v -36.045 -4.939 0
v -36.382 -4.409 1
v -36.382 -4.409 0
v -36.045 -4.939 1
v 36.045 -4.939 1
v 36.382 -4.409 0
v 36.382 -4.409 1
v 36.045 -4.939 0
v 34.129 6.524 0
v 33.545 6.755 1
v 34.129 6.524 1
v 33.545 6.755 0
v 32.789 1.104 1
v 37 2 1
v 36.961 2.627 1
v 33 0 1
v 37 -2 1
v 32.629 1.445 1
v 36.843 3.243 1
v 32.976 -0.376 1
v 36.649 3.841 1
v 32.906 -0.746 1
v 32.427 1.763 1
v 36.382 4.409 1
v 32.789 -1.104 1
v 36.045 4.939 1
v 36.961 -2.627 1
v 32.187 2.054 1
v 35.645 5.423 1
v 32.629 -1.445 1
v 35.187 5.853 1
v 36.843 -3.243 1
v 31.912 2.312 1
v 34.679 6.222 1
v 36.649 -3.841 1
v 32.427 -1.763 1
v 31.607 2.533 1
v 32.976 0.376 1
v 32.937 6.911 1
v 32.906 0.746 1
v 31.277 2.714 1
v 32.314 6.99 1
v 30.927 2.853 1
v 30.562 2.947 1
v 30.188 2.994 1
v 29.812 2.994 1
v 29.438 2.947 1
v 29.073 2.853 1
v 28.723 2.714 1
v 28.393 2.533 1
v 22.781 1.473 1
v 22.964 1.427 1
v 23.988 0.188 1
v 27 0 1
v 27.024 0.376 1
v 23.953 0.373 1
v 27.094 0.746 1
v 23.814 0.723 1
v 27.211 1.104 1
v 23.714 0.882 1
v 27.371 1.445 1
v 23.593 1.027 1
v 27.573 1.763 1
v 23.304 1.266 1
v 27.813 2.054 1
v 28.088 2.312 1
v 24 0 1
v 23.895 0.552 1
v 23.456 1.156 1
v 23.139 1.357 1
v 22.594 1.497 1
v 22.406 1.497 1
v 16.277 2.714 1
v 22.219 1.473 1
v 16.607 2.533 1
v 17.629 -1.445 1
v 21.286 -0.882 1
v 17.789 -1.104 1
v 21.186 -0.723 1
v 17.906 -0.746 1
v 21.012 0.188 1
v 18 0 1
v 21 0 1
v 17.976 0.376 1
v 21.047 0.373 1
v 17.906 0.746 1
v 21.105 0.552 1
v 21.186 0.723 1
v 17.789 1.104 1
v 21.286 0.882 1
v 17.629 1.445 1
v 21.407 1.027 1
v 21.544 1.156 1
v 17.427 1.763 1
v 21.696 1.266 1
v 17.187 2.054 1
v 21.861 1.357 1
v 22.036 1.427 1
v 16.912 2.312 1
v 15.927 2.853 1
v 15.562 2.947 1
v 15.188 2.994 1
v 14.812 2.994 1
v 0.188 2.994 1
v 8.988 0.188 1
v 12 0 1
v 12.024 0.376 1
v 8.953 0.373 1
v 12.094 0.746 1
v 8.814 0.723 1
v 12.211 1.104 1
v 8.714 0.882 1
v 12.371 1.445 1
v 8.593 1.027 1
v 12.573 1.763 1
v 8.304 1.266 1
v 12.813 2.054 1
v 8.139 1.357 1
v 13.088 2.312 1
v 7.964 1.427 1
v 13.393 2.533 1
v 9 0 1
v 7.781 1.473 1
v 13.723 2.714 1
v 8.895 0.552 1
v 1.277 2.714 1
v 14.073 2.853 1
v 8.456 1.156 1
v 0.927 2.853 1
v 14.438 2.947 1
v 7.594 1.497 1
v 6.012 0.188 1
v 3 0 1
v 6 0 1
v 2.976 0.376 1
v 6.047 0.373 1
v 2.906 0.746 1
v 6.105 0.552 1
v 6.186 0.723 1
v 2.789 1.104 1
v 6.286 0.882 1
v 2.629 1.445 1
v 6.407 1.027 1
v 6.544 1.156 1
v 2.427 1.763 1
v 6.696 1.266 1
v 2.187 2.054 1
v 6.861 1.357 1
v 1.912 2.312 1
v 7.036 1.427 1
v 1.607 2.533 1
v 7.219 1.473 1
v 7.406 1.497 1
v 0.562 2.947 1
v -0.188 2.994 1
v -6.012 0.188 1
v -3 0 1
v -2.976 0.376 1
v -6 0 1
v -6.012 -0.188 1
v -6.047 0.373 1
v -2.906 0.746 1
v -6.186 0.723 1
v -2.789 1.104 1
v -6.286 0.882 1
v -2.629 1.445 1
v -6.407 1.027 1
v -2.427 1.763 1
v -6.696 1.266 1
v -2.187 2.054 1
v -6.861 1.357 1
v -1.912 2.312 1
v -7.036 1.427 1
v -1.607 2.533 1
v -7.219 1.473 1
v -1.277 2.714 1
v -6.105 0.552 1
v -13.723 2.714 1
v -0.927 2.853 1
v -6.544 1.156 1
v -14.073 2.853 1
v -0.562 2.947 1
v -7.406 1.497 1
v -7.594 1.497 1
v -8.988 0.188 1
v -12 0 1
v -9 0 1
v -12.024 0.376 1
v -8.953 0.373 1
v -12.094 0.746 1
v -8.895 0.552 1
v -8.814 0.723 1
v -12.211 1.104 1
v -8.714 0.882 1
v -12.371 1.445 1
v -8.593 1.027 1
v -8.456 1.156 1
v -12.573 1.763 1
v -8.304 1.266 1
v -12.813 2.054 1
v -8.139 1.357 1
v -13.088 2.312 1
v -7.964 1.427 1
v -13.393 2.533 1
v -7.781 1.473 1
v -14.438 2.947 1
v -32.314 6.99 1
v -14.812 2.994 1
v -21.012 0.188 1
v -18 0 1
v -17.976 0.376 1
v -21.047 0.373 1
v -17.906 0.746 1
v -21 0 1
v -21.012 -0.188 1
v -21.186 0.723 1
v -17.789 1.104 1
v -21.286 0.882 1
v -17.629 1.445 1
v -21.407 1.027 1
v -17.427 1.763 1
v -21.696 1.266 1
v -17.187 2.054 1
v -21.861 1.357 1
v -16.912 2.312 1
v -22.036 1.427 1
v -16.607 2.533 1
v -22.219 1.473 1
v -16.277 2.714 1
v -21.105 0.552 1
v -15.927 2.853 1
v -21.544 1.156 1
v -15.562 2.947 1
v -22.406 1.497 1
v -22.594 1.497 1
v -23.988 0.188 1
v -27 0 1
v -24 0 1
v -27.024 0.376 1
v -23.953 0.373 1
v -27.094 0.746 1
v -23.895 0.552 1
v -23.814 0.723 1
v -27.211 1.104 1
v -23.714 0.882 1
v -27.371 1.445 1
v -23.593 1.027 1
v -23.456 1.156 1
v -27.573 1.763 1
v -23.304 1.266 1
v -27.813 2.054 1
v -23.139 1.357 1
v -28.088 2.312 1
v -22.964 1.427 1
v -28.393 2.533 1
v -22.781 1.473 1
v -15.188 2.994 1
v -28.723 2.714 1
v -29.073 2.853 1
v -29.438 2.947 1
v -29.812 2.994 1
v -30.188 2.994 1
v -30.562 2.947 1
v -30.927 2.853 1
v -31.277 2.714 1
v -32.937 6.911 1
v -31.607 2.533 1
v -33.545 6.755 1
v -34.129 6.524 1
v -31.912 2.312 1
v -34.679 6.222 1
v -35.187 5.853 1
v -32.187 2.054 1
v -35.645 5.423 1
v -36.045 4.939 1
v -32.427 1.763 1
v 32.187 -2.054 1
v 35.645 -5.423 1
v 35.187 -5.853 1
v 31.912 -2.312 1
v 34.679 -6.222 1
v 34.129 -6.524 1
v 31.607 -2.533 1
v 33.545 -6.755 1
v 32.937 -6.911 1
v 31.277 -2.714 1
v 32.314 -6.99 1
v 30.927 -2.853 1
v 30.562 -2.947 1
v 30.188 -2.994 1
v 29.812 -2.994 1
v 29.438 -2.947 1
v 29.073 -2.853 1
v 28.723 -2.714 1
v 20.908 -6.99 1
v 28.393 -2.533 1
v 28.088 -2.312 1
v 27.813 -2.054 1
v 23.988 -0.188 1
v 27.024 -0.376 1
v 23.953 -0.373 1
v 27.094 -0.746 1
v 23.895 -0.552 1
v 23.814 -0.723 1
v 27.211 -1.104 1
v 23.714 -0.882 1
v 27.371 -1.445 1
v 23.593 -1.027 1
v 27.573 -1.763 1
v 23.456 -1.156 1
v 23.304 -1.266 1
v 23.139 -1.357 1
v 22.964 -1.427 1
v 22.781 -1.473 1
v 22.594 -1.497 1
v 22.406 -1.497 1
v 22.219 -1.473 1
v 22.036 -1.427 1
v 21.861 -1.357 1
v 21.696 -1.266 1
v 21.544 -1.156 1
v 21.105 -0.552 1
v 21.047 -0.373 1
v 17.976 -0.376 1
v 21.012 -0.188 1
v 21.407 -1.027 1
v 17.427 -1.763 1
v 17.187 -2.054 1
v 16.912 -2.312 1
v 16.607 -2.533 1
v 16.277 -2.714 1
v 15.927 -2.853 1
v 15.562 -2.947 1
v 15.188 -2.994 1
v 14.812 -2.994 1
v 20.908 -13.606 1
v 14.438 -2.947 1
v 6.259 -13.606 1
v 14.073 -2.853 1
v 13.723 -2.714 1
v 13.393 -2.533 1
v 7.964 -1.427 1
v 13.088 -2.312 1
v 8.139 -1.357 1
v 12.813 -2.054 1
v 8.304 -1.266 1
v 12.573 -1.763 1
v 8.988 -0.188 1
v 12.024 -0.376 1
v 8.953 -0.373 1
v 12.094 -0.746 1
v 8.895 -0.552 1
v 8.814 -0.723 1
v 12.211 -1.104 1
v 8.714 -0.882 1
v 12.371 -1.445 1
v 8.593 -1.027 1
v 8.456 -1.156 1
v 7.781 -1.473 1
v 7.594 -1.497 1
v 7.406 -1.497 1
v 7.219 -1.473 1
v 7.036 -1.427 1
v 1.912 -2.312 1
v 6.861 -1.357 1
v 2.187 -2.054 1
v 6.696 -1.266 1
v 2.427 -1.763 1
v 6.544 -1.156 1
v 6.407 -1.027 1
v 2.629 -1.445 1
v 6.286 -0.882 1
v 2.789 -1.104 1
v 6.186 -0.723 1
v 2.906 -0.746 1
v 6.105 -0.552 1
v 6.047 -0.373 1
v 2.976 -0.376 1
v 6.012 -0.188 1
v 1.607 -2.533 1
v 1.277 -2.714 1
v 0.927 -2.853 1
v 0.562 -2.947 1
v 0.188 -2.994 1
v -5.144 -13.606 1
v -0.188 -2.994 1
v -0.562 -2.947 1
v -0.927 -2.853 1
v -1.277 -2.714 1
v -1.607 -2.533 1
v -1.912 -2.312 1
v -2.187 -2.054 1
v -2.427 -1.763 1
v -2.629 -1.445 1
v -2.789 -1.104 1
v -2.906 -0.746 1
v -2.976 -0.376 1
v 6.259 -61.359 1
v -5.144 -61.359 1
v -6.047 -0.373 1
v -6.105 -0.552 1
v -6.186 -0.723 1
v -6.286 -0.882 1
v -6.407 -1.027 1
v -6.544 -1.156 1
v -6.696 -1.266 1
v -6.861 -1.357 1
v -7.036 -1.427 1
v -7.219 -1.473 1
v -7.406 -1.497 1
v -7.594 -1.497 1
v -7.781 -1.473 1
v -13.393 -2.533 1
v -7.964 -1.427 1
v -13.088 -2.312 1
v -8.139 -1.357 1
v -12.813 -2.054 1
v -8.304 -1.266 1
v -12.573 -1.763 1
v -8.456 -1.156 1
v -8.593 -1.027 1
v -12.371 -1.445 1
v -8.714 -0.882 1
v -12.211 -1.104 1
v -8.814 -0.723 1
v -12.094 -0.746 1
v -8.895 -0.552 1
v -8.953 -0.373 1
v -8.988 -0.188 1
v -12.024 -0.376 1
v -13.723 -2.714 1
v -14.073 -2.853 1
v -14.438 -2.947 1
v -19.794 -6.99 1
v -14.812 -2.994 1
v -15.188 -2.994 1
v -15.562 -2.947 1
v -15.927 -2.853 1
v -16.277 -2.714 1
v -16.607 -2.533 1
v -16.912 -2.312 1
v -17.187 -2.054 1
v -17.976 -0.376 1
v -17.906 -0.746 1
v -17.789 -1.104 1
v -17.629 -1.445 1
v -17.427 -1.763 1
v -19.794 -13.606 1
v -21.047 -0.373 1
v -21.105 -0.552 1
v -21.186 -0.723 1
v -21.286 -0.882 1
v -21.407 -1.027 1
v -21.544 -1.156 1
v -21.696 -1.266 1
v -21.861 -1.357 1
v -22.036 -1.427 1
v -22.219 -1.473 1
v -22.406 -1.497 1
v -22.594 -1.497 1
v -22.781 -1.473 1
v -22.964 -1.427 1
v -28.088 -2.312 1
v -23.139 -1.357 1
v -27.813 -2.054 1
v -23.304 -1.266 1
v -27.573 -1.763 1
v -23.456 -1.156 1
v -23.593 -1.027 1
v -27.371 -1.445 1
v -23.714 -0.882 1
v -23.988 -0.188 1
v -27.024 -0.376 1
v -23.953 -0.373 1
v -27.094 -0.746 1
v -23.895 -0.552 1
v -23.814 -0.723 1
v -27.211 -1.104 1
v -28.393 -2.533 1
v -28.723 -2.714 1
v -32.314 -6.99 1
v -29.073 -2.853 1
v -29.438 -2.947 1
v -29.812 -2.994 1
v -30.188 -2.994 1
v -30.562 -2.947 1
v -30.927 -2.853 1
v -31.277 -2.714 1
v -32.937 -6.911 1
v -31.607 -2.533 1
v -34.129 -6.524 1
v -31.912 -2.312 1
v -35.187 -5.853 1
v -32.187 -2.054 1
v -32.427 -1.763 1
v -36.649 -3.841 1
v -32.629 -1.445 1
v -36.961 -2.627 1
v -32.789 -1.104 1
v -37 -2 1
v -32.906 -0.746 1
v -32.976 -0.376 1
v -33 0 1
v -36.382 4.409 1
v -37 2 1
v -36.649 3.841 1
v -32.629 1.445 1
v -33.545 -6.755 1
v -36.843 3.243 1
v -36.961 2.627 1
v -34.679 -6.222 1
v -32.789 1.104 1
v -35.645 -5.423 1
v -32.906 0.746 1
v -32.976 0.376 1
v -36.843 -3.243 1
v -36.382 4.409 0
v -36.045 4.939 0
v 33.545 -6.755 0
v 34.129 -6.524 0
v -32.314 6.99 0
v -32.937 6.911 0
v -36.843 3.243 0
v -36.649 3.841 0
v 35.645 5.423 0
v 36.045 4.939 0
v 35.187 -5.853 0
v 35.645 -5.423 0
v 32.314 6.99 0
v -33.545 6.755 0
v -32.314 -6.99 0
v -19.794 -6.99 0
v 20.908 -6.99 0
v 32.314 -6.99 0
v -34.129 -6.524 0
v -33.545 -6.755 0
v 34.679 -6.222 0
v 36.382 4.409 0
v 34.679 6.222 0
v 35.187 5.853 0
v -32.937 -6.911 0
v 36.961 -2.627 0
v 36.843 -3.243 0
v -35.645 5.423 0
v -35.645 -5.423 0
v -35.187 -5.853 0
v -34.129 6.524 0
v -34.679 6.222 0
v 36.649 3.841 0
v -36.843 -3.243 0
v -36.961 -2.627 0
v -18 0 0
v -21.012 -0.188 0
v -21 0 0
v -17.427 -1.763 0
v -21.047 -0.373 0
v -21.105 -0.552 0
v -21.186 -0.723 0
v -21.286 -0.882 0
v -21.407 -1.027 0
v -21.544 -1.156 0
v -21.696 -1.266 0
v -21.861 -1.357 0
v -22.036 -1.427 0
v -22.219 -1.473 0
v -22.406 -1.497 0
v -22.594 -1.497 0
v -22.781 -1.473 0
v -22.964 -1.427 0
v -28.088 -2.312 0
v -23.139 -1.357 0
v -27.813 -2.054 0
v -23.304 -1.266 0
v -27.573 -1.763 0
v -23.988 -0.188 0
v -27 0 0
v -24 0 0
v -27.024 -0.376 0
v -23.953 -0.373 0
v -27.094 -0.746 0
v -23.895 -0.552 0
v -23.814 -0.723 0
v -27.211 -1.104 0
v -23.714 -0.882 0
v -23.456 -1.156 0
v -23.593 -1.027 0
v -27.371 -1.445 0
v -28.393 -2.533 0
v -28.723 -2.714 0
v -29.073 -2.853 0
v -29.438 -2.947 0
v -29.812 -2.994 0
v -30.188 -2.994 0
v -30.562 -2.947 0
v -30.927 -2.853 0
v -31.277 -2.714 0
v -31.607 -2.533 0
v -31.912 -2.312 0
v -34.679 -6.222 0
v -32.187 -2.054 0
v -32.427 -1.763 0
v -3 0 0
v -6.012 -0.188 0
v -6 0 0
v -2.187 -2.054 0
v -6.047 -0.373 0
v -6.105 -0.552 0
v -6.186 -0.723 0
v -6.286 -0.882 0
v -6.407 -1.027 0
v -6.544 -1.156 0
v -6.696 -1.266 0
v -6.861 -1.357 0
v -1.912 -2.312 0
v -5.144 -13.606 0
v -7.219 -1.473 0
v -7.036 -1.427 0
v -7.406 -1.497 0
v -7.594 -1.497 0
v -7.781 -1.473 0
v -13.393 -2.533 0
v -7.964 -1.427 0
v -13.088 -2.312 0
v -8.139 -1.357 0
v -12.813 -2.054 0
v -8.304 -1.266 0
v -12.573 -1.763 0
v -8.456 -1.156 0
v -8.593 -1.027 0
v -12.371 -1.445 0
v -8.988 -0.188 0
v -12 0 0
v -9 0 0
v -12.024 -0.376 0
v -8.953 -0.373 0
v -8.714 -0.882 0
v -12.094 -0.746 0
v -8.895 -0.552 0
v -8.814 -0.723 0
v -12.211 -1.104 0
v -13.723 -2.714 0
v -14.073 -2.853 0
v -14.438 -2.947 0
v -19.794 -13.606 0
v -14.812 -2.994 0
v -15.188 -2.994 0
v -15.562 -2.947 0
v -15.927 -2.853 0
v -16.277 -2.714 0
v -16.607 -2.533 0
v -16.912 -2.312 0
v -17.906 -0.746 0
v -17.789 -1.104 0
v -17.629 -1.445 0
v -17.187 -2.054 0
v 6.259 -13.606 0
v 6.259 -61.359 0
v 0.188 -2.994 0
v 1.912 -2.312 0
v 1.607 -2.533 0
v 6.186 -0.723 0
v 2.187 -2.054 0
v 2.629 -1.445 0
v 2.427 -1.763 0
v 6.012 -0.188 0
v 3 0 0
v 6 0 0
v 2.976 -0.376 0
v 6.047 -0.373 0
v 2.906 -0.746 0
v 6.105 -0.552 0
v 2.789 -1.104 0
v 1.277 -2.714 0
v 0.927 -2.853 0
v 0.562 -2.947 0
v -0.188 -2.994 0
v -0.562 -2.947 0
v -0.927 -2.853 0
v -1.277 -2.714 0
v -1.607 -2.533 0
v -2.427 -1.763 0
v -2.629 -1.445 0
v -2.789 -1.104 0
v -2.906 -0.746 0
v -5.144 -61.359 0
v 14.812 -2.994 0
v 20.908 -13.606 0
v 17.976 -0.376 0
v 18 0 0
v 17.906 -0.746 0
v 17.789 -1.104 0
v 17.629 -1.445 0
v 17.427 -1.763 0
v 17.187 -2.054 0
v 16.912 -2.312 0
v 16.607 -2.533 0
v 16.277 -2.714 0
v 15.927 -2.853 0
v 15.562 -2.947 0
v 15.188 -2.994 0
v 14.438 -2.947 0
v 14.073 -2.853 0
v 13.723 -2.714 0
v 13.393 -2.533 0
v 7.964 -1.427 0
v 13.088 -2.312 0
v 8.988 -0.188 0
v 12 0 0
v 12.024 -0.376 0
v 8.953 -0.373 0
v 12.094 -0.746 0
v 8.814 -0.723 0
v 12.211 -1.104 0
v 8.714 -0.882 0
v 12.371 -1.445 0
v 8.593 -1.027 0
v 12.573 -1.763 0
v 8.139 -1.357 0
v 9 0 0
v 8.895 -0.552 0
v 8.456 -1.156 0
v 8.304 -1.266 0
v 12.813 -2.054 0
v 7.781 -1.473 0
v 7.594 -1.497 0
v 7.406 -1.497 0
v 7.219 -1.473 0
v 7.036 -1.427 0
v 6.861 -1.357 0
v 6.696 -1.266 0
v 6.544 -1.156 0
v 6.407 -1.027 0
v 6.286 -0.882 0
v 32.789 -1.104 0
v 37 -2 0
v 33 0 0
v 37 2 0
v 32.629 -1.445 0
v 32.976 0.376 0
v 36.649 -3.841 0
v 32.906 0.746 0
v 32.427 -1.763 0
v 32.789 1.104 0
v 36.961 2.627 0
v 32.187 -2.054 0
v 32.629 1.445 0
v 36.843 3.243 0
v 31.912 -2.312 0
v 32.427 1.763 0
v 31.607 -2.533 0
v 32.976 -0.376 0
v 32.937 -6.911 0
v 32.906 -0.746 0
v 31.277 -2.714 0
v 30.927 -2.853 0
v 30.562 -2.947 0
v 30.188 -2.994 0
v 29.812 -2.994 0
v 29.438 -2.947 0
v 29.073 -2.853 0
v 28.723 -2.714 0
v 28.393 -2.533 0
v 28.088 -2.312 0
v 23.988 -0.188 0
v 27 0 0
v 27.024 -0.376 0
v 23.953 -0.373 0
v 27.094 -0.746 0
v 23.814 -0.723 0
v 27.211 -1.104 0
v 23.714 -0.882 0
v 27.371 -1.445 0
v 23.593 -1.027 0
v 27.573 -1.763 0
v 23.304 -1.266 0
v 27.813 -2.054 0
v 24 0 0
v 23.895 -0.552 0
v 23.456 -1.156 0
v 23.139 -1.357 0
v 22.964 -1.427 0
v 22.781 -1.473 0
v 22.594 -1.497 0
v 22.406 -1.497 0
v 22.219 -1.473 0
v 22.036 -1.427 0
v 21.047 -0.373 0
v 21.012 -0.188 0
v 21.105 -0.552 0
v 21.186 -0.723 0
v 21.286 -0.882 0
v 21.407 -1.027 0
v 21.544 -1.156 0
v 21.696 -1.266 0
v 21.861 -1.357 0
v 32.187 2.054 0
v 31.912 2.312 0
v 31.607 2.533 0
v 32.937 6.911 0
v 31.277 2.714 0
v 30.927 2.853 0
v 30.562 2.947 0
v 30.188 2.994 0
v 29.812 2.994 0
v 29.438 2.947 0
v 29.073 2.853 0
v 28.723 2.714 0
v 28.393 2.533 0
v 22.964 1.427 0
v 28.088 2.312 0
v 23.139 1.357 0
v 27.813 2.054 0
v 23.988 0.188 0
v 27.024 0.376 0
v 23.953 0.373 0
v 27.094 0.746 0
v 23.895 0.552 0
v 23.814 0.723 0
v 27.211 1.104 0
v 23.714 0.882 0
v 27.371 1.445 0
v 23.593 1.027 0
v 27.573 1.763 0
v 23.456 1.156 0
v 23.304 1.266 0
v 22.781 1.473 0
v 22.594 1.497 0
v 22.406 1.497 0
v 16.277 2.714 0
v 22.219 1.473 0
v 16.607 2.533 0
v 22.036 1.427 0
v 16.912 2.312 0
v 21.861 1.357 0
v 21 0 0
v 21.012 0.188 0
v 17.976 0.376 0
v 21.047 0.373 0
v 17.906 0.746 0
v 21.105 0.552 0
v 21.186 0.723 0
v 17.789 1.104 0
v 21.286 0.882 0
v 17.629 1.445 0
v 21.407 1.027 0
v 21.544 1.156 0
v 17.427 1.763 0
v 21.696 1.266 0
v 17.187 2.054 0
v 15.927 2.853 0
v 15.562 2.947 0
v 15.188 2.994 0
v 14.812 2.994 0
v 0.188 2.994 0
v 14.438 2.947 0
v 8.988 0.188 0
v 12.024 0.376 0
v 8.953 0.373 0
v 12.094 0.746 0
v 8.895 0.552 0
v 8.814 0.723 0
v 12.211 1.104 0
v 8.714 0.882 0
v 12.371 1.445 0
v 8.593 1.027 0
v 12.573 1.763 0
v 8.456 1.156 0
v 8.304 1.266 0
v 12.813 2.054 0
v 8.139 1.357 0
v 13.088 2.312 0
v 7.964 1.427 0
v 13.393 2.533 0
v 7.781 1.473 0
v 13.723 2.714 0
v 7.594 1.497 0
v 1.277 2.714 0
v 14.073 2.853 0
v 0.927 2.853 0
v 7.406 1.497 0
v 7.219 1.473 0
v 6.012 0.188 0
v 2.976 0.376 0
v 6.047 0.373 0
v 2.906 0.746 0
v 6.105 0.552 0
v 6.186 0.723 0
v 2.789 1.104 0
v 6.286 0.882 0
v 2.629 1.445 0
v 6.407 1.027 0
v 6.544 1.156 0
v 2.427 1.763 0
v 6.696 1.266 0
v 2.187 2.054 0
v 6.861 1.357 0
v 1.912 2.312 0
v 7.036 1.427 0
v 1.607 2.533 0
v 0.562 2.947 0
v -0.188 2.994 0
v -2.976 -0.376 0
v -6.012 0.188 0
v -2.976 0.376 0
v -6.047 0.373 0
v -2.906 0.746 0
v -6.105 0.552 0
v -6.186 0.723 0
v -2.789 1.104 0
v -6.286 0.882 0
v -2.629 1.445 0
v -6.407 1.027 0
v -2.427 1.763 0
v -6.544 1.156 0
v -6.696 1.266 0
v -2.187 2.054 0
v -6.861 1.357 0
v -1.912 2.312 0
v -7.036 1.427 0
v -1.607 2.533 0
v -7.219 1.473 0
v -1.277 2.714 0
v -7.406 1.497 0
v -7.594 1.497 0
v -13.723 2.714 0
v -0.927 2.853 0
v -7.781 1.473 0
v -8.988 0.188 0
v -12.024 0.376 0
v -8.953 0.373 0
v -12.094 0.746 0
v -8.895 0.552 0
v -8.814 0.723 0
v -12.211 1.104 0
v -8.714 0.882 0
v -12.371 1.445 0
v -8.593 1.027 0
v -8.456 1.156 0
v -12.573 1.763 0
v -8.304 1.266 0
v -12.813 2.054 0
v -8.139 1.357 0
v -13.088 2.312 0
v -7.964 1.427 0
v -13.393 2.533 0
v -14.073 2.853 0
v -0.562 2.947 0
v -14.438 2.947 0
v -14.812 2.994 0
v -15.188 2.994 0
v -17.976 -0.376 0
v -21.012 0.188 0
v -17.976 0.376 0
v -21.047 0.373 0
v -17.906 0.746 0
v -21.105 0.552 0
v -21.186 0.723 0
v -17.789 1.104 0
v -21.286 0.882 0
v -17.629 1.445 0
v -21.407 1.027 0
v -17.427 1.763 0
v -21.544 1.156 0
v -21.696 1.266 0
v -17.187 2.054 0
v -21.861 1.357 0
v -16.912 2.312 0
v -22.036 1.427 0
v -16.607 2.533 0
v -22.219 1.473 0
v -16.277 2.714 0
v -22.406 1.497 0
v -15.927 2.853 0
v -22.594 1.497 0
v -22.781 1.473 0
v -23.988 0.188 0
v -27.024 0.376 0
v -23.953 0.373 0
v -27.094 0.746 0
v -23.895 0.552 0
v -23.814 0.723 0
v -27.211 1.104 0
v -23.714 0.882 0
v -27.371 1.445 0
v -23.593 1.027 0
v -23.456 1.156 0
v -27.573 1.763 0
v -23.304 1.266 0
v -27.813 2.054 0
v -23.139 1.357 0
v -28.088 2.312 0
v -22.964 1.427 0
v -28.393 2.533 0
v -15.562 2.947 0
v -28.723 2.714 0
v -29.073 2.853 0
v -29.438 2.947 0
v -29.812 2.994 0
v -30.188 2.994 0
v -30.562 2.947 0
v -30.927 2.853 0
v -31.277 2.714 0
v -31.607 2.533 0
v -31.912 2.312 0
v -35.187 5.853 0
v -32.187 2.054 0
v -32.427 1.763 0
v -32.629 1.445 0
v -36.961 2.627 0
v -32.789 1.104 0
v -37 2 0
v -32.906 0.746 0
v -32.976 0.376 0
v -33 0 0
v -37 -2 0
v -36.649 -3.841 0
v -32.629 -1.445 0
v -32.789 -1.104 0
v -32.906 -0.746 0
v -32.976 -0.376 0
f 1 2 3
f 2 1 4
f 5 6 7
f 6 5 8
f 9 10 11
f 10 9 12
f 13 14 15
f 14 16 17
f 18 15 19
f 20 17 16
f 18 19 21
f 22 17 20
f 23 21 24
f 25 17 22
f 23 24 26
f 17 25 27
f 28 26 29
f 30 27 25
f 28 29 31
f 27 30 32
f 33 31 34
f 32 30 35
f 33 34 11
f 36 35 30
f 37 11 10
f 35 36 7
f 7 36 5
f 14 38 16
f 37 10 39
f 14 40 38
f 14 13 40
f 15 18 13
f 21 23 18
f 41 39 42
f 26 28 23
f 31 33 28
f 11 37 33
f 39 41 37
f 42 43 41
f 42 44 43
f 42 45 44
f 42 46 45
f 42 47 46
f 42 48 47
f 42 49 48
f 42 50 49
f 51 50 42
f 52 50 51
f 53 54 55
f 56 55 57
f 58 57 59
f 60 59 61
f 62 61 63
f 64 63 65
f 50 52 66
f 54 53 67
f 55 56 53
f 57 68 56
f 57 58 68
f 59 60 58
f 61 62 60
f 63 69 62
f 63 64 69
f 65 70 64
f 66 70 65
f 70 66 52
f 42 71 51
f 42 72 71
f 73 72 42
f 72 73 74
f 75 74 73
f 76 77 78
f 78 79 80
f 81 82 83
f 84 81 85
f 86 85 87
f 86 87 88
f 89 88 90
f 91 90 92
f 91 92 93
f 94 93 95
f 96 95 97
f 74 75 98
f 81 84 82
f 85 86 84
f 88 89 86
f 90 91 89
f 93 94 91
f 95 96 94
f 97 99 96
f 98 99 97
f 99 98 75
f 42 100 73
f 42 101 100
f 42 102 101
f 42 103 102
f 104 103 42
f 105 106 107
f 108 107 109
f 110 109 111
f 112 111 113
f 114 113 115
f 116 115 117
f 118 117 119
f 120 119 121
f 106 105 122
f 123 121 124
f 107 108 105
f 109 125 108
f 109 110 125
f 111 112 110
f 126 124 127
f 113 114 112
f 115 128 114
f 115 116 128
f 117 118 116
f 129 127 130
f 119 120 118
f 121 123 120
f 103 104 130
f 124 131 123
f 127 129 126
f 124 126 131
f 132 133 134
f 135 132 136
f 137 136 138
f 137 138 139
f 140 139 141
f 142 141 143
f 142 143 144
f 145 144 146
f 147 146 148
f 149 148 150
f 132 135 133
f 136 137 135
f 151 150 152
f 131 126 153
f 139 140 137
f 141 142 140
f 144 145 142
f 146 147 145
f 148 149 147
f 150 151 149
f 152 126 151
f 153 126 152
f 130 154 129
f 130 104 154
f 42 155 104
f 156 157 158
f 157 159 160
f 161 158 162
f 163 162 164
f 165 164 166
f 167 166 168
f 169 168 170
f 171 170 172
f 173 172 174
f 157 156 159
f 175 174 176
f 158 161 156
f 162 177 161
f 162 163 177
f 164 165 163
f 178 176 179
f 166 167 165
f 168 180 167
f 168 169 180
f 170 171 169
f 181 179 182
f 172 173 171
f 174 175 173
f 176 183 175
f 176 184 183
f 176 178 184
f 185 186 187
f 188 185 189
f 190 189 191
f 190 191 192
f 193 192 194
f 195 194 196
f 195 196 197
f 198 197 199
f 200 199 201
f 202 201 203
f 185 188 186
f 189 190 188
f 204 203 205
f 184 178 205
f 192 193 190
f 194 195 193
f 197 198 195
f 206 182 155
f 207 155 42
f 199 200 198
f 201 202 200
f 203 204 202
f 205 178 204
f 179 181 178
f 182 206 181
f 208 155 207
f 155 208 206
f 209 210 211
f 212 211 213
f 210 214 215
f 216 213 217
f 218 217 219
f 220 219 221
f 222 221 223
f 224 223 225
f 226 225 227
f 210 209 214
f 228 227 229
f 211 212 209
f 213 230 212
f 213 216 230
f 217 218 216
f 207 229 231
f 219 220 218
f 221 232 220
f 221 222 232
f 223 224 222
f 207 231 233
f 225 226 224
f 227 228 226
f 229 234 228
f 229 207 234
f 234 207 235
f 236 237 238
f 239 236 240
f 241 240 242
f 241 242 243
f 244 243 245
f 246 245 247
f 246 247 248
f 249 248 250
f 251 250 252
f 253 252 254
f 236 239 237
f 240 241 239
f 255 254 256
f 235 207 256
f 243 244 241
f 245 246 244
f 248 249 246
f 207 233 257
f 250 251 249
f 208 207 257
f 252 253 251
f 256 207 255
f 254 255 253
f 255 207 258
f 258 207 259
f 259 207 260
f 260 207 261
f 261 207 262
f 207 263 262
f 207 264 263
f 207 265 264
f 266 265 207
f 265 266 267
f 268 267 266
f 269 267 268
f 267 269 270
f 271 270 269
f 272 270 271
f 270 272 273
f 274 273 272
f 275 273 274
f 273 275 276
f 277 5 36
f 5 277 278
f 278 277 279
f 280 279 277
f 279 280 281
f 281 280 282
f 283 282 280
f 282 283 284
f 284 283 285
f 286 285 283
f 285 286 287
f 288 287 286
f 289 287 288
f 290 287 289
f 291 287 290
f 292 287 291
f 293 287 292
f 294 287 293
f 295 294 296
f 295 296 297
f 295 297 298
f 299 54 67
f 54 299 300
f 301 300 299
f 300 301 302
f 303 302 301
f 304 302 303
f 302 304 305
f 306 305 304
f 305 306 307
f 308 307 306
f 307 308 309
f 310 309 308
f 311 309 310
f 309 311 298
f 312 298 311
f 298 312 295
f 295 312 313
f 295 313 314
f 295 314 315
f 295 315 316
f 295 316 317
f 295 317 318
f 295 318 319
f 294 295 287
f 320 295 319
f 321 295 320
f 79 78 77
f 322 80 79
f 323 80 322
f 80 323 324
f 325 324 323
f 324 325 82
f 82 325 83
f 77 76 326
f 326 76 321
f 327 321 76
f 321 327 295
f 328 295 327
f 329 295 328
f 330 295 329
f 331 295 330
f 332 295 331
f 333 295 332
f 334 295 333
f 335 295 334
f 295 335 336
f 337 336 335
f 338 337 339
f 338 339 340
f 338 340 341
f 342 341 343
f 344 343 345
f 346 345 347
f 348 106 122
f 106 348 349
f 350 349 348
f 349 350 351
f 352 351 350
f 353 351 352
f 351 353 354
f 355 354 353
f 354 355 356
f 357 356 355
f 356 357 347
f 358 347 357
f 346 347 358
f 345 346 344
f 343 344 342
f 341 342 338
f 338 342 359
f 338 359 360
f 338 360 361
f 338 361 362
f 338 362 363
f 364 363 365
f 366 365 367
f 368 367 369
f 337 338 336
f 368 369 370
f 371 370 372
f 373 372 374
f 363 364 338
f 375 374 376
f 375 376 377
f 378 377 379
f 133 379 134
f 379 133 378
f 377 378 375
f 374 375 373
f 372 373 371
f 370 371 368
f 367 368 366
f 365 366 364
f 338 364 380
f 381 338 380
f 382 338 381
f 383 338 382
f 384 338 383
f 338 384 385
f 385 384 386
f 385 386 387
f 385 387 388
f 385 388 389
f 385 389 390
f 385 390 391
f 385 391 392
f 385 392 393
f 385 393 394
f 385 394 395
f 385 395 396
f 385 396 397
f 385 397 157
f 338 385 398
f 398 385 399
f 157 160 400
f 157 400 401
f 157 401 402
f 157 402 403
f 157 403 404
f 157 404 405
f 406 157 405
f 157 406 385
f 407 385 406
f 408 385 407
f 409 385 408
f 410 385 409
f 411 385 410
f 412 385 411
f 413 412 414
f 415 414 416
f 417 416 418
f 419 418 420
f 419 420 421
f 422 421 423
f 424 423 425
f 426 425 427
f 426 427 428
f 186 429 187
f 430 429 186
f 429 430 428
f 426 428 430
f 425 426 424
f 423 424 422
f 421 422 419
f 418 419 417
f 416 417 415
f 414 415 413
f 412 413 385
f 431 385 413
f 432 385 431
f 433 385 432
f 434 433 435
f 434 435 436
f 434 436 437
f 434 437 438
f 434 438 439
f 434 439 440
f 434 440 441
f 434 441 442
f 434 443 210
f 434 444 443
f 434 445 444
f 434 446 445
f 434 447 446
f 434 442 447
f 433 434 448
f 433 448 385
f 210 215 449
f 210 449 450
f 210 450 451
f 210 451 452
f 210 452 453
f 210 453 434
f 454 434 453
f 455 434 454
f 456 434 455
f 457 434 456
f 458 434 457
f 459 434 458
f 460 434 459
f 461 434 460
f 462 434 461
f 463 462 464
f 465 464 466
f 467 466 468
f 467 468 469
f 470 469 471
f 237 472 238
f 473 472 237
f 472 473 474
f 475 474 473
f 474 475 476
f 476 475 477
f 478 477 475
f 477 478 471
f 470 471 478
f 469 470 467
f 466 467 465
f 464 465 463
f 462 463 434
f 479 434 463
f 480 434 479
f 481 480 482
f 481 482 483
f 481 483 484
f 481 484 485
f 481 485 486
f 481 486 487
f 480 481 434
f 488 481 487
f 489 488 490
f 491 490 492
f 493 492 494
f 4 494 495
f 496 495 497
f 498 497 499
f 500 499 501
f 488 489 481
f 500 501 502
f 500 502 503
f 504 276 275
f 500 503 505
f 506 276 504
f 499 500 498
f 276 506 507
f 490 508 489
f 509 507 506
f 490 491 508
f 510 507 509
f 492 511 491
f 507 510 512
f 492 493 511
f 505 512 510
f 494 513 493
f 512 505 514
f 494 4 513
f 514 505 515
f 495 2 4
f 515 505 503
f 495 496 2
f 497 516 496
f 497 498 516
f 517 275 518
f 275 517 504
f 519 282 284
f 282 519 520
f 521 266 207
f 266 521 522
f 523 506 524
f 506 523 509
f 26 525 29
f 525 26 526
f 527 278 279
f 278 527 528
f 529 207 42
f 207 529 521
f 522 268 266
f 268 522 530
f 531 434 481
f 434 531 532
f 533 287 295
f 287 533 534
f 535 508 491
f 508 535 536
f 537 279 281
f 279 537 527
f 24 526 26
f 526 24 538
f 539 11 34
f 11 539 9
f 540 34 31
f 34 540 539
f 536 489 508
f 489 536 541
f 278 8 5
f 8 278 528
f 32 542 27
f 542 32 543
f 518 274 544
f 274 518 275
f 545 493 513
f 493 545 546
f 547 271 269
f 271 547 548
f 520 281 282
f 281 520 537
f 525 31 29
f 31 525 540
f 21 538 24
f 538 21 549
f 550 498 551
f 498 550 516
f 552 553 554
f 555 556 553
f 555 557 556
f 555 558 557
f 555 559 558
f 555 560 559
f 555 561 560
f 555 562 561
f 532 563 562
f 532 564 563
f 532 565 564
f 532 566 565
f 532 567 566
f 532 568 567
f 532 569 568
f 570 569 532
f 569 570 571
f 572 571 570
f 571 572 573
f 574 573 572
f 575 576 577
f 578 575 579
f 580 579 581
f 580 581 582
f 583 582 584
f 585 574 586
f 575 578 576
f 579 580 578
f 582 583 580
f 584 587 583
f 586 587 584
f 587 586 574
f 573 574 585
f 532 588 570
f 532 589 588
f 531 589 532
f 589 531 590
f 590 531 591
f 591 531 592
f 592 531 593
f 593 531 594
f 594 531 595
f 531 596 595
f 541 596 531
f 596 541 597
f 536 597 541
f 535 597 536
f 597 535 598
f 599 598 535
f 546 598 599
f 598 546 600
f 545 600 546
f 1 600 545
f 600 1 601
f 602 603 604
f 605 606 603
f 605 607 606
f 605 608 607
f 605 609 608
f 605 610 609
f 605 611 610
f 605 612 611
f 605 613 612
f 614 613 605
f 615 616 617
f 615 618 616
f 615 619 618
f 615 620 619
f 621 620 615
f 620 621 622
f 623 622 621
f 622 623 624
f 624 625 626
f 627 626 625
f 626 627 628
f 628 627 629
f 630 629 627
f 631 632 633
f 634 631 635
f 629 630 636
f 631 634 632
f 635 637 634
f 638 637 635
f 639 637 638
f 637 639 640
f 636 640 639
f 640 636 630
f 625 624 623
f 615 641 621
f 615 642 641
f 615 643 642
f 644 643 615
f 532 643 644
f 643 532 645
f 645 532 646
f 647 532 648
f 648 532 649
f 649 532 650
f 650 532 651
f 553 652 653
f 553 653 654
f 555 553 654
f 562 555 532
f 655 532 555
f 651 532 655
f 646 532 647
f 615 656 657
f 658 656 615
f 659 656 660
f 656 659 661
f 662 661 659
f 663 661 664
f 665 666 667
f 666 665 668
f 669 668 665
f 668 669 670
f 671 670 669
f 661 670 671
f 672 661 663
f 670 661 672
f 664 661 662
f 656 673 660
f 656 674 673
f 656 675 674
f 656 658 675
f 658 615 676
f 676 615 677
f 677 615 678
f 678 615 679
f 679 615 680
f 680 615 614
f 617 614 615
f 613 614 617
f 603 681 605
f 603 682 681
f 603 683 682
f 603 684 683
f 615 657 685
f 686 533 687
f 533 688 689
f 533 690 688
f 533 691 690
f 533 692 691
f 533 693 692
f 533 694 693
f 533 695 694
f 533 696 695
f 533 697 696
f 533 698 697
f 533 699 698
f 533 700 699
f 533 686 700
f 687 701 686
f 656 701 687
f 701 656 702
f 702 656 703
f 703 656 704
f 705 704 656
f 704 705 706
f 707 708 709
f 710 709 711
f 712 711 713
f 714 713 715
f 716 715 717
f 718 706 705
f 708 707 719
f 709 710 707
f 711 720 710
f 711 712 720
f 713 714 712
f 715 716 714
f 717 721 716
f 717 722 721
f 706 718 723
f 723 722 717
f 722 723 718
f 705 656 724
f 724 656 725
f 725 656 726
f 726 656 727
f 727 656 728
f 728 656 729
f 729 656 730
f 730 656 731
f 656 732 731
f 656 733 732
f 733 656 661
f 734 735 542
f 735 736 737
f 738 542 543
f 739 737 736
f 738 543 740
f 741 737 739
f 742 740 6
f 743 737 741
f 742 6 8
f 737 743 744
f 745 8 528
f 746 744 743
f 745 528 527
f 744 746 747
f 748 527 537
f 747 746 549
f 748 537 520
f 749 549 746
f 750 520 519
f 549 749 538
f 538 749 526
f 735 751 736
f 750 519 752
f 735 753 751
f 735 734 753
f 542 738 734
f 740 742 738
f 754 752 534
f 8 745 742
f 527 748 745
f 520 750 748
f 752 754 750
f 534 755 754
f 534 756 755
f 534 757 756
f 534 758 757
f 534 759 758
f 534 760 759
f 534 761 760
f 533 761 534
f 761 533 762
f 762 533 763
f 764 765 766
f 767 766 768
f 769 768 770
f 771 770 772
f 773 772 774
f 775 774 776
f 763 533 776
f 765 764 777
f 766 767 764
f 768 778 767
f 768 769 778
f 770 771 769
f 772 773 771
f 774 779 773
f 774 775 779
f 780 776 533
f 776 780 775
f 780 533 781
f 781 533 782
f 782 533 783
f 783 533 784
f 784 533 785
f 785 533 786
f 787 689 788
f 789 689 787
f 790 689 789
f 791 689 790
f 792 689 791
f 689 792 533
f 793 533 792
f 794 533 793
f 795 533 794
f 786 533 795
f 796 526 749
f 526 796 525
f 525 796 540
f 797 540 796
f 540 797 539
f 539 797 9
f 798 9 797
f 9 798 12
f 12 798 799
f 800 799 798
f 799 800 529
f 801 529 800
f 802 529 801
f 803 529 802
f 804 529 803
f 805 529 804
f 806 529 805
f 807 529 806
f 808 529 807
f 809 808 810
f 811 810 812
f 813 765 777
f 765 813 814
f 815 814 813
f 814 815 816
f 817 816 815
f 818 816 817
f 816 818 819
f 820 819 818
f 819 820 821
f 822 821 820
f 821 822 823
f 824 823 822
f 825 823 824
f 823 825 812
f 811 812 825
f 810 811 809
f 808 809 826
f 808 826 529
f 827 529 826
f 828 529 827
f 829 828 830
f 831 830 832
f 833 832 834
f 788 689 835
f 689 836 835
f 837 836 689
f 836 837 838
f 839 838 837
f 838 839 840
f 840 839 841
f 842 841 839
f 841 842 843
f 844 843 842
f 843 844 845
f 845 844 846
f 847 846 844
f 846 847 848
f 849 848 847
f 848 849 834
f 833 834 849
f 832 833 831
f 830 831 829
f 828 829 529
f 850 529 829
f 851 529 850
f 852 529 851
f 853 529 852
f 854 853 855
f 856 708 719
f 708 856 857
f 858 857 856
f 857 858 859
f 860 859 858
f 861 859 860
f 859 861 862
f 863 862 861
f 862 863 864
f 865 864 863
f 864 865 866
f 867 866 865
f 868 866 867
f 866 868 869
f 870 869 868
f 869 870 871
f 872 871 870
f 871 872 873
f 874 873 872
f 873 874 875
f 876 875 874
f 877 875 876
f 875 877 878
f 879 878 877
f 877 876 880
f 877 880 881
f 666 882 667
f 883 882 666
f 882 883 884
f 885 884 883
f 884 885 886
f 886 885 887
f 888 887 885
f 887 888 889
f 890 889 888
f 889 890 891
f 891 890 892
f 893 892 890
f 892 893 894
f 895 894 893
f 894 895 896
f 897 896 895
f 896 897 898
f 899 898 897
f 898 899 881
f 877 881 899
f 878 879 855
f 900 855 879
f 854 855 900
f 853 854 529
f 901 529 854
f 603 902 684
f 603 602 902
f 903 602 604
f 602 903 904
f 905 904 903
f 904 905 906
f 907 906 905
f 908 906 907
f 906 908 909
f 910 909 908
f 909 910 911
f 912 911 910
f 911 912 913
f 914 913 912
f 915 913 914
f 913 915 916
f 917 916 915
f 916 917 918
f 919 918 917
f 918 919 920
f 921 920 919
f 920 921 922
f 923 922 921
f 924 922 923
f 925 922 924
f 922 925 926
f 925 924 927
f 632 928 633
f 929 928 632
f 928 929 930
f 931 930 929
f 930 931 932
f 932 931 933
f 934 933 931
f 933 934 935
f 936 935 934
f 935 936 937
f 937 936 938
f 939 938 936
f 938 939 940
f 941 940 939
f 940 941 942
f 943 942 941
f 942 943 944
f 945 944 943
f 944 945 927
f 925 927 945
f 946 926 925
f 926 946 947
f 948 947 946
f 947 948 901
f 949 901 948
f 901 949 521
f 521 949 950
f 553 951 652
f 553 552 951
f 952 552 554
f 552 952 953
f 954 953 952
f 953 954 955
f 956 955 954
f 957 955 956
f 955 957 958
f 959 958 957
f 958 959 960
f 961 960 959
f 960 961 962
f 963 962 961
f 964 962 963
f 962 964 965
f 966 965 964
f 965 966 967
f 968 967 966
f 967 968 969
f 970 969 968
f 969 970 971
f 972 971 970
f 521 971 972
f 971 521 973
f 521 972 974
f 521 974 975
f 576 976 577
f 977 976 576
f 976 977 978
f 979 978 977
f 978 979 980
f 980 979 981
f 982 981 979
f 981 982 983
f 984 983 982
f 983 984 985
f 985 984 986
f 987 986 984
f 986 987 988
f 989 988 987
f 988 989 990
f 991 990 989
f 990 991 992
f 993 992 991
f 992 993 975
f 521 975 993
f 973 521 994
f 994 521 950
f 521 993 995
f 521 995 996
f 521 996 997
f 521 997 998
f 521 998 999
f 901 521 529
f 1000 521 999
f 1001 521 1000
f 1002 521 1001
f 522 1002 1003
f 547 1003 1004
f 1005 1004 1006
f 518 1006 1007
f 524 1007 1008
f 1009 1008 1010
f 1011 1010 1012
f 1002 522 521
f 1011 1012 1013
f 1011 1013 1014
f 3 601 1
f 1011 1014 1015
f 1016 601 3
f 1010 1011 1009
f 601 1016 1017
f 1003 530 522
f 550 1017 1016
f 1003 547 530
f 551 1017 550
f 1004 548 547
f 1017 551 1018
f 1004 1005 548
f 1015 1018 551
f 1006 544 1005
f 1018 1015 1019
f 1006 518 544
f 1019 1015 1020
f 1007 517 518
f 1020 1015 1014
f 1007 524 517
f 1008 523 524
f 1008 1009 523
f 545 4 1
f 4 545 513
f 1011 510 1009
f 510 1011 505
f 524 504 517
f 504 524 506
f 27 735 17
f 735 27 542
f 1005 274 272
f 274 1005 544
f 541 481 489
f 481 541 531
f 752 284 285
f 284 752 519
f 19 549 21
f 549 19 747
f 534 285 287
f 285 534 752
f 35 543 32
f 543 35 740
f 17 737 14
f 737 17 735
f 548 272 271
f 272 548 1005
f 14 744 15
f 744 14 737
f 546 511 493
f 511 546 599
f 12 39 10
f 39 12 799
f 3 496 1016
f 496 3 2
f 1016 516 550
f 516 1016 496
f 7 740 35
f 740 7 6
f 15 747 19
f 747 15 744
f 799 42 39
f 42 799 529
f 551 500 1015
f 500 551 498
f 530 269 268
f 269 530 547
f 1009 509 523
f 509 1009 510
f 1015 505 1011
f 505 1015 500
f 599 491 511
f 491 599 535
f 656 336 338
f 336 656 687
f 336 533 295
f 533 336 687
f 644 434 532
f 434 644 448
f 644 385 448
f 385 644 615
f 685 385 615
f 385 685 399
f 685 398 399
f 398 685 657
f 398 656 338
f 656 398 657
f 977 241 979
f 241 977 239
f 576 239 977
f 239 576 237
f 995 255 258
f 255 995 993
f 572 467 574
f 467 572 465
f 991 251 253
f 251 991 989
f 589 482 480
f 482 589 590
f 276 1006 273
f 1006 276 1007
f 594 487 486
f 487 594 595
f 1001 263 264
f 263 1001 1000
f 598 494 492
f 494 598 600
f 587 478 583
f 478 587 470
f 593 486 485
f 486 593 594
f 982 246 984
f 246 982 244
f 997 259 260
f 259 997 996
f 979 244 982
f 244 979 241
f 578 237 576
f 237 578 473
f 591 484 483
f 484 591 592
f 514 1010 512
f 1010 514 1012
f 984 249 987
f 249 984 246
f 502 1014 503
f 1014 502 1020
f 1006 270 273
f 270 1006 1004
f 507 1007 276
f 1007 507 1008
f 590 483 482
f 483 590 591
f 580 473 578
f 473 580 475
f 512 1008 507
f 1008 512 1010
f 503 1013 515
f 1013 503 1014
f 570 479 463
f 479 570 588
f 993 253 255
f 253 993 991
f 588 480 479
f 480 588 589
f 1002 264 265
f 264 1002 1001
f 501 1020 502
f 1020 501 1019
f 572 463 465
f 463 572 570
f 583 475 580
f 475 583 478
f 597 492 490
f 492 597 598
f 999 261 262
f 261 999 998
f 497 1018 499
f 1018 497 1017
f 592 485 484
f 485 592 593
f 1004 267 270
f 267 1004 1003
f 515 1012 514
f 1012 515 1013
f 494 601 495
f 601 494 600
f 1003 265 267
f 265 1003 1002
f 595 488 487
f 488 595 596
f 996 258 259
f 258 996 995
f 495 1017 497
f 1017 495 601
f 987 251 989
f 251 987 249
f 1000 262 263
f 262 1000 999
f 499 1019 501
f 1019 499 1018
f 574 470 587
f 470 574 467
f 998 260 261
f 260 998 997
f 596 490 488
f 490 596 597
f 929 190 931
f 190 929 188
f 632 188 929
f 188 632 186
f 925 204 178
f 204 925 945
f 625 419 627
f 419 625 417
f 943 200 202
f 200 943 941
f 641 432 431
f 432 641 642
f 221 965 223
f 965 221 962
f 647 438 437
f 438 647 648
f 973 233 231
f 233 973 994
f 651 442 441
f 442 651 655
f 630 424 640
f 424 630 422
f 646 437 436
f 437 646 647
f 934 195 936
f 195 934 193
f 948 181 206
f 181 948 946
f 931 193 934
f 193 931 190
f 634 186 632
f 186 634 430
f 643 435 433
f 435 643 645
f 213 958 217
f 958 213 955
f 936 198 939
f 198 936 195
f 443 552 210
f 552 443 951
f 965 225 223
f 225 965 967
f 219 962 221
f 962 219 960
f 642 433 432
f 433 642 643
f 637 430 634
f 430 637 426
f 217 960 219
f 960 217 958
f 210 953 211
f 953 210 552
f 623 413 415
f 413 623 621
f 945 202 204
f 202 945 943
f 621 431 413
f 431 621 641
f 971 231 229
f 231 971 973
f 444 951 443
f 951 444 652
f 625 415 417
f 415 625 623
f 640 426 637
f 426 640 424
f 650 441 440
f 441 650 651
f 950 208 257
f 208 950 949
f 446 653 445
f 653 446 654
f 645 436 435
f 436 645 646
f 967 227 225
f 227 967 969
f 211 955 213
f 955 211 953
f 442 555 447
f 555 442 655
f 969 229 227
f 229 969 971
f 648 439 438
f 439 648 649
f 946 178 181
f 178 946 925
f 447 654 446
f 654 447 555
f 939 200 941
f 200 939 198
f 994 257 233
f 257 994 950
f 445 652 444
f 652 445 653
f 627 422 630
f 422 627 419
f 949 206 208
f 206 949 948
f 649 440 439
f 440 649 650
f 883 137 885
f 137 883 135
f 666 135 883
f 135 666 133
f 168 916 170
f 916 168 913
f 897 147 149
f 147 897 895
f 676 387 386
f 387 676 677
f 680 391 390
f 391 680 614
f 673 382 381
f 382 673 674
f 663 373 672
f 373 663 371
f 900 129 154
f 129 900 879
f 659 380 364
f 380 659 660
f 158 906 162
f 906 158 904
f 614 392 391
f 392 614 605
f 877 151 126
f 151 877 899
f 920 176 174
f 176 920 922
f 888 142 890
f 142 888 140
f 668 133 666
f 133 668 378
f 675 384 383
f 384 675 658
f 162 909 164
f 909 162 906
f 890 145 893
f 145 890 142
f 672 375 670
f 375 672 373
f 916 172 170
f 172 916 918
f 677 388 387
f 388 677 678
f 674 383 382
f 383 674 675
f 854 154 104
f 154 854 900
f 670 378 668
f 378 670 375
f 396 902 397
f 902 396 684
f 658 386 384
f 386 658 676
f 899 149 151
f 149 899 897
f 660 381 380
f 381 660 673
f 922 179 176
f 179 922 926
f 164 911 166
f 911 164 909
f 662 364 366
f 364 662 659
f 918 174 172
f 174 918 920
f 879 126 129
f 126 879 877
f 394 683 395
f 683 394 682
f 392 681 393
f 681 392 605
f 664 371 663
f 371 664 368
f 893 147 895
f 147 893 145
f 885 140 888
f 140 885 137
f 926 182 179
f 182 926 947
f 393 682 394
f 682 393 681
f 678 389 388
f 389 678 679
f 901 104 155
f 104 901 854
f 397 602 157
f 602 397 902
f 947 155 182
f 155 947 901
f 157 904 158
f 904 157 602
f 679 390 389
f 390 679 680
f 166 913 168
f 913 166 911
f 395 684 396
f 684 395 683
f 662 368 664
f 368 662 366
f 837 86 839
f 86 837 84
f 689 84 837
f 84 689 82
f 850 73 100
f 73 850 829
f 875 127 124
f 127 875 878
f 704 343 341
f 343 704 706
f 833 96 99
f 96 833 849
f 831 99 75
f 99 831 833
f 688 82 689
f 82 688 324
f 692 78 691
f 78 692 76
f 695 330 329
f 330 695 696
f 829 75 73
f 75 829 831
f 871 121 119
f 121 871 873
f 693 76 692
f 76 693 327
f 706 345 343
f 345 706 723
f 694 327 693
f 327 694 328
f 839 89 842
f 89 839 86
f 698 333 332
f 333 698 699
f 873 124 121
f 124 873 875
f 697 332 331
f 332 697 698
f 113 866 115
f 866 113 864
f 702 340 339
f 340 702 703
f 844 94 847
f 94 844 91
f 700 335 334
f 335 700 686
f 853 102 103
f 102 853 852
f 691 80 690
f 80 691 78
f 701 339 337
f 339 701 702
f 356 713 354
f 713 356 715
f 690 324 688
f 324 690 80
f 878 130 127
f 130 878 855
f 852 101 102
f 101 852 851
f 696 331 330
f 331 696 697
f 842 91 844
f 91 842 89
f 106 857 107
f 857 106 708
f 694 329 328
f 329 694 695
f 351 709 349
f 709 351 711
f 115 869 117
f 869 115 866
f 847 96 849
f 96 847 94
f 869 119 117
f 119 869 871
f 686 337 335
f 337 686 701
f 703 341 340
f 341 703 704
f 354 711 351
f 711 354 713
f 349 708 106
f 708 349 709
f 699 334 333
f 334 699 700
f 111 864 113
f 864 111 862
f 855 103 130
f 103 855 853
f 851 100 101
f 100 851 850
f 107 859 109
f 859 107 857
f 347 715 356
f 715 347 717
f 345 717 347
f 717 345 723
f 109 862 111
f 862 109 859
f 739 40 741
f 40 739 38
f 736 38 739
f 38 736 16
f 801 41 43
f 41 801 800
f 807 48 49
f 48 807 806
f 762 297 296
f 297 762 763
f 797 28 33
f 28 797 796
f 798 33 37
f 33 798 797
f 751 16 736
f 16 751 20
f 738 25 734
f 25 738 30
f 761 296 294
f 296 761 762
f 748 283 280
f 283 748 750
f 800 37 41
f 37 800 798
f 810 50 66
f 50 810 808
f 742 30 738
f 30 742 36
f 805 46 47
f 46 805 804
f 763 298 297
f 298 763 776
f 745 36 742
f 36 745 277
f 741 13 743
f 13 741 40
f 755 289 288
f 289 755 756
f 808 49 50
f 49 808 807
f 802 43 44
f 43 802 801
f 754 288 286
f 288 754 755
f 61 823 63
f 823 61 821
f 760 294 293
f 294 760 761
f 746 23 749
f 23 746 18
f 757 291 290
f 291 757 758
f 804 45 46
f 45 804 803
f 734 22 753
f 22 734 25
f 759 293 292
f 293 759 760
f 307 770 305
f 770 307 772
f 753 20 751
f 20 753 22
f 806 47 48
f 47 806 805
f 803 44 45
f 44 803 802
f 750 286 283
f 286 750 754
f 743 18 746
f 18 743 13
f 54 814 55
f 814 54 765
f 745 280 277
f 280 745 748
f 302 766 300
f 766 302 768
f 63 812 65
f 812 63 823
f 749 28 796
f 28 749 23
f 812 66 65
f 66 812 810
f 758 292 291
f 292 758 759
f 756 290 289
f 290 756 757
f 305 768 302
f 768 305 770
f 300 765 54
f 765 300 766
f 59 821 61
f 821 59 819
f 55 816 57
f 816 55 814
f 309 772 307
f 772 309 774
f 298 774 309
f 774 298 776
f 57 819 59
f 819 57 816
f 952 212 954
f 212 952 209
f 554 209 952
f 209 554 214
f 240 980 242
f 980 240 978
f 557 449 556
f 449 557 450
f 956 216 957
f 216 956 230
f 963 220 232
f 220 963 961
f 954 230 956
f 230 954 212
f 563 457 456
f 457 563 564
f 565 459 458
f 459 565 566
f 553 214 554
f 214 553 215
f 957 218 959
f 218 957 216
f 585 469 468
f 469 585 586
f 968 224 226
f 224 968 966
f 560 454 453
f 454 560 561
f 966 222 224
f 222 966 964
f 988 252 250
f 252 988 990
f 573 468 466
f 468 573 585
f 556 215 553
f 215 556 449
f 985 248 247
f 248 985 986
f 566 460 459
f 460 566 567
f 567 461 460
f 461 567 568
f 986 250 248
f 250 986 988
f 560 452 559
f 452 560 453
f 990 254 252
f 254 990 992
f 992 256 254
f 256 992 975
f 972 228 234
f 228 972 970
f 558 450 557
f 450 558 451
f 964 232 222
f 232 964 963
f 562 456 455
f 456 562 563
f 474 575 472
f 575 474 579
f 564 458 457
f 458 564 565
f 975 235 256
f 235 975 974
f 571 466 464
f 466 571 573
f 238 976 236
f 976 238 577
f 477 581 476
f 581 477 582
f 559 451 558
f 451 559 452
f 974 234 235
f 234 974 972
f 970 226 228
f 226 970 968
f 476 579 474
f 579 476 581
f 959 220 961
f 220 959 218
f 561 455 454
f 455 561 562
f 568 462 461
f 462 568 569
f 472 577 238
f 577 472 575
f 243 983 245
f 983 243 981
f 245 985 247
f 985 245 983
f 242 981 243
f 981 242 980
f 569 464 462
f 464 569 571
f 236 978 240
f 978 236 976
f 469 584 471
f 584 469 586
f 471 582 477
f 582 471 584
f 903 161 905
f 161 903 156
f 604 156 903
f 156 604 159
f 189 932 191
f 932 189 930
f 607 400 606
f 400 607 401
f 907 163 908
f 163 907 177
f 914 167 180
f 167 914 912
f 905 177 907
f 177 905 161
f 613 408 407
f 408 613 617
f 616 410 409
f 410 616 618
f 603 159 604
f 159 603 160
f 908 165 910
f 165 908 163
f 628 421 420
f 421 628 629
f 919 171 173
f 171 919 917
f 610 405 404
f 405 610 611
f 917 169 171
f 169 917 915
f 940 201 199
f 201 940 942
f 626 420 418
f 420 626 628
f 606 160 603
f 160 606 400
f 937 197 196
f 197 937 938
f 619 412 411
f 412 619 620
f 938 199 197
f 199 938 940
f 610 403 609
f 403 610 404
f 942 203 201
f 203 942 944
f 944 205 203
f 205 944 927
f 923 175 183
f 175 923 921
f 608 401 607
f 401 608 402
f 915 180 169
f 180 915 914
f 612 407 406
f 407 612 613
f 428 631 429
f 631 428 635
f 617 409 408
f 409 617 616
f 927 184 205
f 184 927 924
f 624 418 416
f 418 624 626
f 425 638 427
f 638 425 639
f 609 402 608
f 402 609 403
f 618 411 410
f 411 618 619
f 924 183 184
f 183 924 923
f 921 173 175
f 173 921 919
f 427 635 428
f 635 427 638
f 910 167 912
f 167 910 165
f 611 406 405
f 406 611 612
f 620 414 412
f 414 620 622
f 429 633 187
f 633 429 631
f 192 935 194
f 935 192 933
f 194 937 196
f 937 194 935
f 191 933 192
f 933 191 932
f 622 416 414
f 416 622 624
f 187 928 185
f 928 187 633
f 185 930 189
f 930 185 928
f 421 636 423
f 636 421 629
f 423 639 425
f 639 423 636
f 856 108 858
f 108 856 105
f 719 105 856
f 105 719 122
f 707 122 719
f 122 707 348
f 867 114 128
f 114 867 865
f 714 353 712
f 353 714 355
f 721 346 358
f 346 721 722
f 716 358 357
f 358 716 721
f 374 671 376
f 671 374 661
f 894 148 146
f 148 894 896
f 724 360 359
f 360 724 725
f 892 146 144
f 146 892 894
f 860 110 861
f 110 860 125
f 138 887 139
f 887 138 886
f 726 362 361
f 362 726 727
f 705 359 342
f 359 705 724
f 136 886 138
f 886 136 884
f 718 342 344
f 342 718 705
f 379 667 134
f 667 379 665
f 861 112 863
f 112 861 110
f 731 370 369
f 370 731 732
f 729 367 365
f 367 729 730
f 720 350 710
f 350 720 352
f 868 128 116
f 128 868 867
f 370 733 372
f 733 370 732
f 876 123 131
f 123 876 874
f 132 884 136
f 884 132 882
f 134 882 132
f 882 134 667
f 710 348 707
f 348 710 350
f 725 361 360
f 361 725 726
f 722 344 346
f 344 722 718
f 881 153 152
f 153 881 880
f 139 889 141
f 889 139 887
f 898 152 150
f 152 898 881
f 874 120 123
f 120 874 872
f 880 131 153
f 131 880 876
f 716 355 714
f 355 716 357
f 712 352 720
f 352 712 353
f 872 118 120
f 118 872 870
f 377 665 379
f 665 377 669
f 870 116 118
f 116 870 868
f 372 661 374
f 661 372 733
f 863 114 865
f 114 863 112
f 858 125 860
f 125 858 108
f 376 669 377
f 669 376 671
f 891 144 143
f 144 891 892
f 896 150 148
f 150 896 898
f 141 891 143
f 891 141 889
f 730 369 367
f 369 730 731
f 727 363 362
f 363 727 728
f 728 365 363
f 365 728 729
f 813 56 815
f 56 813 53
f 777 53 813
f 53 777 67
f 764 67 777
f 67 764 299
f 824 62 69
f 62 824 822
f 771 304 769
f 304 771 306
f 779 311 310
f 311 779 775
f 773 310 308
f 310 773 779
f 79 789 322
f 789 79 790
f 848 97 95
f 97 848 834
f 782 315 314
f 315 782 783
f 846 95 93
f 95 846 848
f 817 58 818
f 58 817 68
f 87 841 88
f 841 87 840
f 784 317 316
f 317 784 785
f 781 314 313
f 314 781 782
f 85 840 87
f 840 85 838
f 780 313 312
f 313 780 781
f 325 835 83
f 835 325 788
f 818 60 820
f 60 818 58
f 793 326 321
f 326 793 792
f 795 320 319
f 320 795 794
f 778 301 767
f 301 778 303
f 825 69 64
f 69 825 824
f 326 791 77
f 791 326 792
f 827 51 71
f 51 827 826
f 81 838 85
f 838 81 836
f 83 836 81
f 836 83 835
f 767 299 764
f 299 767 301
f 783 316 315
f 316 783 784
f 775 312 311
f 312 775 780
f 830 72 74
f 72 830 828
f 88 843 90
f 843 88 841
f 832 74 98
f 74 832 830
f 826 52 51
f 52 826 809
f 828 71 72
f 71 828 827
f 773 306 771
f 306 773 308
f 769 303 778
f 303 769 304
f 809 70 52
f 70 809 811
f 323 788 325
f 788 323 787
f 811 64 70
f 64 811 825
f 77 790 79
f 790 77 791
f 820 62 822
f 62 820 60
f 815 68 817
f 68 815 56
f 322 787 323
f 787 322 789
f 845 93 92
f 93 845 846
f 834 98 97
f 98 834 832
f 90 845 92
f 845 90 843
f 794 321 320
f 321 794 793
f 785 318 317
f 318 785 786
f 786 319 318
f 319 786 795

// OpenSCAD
$fn = 50;


difference() {
	union() {
		*color(alpha = 1.0000000000, c = "gray") {
			translate(v = [0, 14, 0]) {
				linear_extrude(height = 1) {
					text(font = "Arial:style=Bold", halign = "center", size = 4.5000000000, text = "COMMENT description oobb_plate_shape_p_type_1_depth_5_width_1_thickness_t_extra_oobb_size", valign = "center");
				}
			}
		}
		hull() {
			translate(v = [-32.0000000000, 2.0000000000, 0]) {
				cylinder(h = 1, r = 5);
			}
			translate(v = [32.0000000000, 2.0000000000, 0]) {
				cylinder(h = 1, r = 5);
			}
			translate(v = [-32.0000000000, -2.0000000000, 0]) {
				cylinder(h = 1, r = 5);
			}
			translate(v = [32.0000000000, -2.0000000000, 0]) {
				cylinder(h = 1, r = 5);
			}
		}
		translate(v = [0, -5, 0]) {
			linear_extrude(height = 1) {
				text(font = "DejaVu Sans Mono:style=Bold", halign = "center", size = 57.0000000000, text = "T", valign = "top");
			}
		}
	}
	union() {
		*color(alpha = 1.0000000000, c = "gray") {
			translate(v = [0, 14, 0]) {
				linear_extrude(height = 1) {
					text(font = "Arial:style=Bold", halign = "center", size = 4.5000000000, text = "COMMENT description oobb_holes_shape_n_type_5_width_1_thickness_t_extra_oobb_size_1_height_'all'_holes_true_both_holes", valign = "center");
				}
			}
		}
		translate(v = [-30.0000000000, 0.0000000000, 0]) {
			translate(v = [0, 0, -50]) {
				cylinder(h = 100, r = 3.0000000000);
			}
		}
		translate(v = [-15.0000000000, 0.0000000000, 0]) {
			translate(v = [0, 0, -50]) {
				cylinder(h = 100, r = 3.0000000000);
			}
		}
		translate(v = [0, 0, -50]) {
			cylinder(h = 100, r = 3.0000000000);
		}
		translate(v = [15.0000000000, 0.0000000000, 0]) {
			translate(v = [0, 0, -50]) {
				cylinder(h = 100, r = 3.0000000000);
			}
		}
		translate(v = [30.0000000000, 0.0000000000, 0]) {
			translate(v = [0, 0, -50]) {
				cylinder(h = 100, r = 3.0000000000);
			}
		}
		translate(v = [-30.0000000000, 0.0000000000, 0]) {
			translate(v = [0, 0, -50]) {
				cylinder(h = 100, r = 1.5000000000);
			}
		}
		translate(v = [-22.5000000000, 0.0000000000, 0]) {
			translate(v = [0, 0, -50]) {
				cylinder(h = 100, r = 1.5000000000);
			}
		}
		translate(v = [-15.0000000000, 0.0000000000, 0]) {
			translate(v = [0, 0, -50]) {
				cylinder(h = 100, r = 1.5000000000);
			}
		}
		translate(v = [-7.5000000000, 0.0000000000, 0]) {
			translate(v = [0, 0, -50]) {
				cylinder(h = 100, r = 1.5000000000);
			}
		}
		translate(v = [0, 0, -50]) {
			cylinder(h = 100, r = 1.5000000000);
		}
		translate(v = [7.5000000000, 0.0000000000, 0]) {
			translate(v = [0, 0, -50]) {
				cylinder(h = 100, r = 1.5000000000);
			}
		}
		translate(v = [15.0000000000, 0.0000000000, 0]) {
			translate(v = [0, 0, -50]) {
				cylinder(h = 100, r = 1.5000000000);
			}
		}
		translate(v = [22.5000000000, 0.0000000000, 0]) {
			translate(v = [0, 0, -50]) {
				cylinder(h = 100, r = 1.5000000000);
			}
		}
		translate(v = [30.0000000000, 0.0000000000, 0]) {
			translate(v = [0, 0, -50]) {
				cylinder(h = 100, r = 1.5000000000);
			}
		}
	}
}
